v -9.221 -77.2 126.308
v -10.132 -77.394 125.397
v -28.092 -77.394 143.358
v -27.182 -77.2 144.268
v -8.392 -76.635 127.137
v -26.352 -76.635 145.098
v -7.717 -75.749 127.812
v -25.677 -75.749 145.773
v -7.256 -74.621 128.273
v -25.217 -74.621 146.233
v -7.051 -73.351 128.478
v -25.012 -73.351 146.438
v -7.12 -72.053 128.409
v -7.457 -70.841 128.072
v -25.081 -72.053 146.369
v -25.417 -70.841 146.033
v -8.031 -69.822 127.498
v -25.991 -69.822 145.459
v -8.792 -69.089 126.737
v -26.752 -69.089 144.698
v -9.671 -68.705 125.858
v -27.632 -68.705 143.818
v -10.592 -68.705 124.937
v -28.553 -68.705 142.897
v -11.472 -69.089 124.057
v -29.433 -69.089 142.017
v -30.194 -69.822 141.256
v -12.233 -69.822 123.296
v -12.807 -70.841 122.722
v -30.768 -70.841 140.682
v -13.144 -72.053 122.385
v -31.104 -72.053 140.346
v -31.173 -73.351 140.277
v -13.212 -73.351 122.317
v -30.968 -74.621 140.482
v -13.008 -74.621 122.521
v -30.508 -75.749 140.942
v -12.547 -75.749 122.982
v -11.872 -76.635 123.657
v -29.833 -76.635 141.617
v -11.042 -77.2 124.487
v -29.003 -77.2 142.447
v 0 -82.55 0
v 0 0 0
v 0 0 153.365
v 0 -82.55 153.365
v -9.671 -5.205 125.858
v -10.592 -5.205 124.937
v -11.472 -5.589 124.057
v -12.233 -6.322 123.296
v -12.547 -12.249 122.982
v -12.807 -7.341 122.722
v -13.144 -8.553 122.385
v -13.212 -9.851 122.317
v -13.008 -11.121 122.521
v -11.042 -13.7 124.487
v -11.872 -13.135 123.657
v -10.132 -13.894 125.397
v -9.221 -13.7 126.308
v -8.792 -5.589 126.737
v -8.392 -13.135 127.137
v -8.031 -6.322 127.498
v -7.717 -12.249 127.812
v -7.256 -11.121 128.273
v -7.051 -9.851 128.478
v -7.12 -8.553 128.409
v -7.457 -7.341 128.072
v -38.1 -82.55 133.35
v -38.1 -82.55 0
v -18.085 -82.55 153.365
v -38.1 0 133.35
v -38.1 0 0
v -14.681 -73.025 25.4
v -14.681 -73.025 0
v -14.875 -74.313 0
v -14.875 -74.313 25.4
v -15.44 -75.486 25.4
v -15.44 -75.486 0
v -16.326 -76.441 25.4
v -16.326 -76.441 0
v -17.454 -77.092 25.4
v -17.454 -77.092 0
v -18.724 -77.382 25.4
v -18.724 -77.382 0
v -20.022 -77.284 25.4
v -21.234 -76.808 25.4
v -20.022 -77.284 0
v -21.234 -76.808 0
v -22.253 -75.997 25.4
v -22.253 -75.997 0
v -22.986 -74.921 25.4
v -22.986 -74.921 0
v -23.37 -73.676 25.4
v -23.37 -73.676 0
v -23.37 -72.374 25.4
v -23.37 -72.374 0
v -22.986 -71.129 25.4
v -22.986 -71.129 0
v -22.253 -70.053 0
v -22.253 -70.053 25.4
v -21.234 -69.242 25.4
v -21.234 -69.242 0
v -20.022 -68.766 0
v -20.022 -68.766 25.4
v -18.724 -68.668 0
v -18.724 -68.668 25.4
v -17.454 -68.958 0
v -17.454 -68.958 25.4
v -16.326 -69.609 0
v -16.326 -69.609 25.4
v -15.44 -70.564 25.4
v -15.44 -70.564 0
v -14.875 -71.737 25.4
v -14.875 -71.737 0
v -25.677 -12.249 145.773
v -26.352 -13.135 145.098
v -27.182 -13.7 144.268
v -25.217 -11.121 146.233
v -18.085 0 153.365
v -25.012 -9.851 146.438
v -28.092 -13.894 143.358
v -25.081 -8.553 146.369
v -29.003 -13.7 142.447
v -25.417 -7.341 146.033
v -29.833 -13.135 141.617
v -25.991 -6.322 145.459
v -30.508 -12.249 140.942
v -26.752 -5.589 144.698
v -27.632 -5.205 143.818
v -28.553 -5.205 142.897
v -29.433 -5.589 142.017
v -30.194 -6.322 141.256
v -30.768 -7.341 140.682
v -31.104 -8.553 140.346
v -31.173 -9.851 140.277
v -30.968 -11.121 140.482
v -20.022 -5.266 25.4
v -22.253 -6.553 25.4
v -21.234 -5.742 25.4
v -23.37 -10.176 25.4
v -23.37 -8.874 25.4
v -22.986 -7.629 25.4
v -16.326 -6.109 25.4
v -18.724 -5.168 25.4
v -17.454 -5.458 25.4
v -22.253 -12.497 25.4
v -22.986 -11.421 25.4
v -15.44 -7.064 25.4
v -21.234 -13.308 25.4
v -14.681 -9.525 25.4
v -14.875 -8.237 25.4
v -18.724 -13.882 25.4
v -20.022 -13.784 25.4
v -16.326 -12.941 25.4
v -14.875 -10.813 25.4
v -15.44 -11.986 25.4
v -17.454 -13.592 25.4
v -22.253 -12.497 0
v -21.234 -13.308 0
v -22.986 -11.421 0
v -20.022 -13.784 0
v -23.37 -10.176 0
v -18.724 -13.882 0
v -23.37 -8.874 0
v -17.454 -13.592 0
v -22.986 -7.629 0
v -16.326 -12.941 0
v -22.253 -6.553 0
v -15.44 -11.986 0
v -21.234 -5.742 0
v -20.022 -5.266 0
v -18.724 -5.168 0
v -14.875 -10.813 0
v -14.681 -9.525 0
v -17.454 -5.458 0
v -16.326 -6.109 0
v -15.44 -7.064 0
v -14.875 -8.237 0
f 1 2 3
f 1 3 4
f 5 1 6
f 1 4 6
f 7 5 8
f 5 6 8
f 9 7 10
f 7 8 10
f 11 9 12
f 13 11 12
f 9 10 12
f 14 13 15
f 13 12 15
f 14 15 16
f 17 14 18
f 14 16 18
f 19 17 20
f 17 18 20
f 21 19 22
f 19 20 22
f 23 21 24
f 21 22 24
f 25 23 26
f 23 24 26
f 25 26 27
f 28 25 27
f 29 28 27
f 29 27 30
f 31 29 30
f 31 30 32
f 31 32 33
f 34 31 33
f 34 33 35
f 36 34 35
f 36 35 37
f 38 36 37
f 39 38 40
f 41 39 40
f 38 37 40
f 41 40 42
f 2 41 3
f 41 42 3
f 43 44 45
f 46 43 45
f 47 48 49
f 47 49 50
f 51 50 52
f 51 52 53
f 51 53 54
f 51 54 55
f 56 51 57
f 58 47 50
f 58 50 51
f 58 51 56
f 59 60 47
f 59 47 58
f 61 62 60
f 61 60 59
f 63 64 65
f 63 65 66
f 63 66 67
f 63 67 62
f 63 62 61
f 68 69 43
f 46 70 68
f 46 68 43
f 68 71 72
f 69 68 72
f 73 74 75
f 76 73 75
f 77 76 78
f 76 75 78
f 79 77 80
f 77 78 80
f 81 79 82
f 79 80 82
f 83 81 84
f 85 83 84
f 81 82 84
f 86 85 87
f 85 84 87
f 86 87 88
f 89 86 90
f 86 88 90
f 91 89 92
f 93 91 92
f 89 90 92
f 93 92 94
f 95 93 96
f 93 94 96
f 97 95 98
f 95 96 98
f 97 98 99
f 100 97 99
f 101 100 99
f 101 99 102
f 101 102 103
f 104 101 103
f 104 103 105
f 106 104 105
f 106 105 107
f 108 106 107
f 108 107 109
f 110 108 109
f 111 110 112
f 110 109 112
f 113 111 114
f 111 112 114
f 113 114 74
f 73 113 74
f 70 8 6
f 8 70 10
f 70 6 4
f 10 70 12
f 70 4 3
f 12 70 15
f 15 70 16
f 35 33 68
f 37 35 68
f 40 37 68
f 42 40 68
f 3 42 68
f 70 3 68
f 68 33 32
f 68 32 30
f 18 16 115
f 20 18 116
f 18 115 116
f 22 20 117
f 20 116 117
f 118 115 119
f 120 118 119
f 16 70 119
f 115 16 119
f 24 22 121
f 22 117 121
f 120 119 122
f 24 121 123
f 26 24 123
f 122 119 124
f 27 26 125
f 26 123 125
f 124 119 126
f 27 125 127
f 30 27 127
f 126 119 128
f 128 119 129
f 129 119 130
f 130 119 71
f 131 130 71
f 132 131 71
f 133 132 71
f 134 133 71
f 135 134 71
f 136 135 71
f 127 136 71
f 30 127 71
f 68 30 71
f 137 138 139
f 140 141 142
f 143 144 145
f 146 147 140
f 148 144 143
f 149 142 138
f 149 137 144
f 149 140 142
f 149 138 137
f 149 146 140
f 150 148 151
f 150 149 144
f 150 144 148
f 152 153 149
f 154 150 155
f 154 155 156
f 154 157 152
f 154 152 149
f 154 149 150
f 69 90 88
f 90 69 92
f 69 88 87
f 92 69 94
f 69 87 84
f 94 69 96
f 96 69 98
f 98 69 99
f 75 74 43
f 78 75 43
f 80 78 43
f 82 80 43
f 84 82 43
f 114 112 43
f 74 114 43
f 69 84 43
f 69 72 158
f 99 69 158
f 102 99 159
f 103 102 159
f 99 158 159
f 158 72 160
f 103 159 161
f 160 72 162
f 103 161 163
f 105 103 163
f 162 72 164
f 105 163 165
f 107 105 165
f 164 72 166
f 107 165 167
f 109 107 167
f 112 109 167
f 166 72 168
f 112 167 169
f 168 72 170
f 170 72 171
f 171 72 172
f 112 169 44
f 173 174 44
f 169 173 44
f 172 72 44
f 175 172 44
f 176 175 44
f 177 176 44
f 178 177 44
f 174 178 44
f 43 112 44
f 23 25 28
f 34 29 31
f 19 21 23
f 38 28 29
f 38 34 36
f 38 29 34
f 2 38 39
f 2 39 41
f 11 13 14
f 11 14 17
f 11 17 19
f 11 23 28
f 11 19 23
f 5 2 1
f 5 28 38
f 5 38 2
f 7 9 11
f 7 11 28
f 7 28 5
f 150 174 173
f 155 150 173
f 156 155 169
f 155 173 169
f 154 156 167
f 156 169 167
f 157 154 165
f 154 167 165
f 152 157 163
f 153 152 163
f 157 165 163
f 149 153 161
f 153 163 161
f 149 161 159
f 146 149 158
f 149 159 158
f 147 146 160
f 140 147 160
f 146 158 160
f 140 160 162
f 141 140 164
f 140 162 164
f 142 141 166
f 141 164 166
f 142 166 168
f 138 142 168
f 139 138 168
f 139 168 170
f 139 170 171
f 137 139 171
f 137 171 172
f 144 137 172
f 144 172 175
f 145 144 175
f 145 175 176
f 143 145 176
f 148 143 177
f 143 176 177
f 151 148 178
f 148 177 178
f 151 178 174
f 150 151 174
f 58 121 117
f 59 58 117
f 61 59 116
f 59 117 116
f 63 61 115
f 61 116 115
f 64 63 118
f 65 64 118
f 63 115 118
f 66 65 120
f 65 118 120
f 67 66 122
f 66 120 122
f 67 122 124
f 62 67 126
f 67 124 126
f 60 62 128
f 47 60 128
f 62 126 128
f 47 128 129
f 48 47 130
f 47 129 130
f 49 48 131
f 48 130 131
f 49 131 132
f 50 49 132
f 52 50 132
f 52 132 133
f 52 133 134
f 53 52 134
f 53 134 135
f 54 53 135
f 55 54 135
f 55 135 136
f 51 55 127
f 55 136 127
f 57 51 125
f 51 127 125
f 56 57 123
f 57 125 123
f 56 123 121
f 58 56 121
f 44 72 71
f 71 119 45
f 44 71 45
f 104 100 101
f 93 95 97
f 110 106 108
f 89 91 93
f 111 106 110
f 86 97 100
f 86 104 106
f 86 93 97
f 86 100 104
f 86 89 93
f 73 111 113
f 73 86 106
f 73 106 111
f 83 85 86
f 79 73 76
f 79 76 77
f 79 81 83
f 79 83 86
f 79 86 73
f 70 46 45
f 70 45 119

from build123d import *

# Parameters (mm, degrees)
F1_DEPTH = 82.55
F3_R     = 4.3688
F4_DEPTH = 25.4
F5_DEPTH = 25.4


with BuildPart() as f1:
    # F0 (on Front) → F1 (new body)
    with BuildSketch(Plane.XZ):
        Polygon((-38.1, 0), (0, 0), (0, 153.3652), (-18.0848, 153.3652), (-38.1, 133.35), align=None)
    extrude(amount=F1_DEPTH)

    # F3 (on face) → F4 (cut)
    with BuildSketch(Plane(origin=(0, 0, 0), x_dir=(1, 0, 0), z_dir=(0, 0, -1))):
        with Locations((-19.05, 9.525)):
            Circle(F3_R)
        with Locations((-19.05, 73.025)):
            Circle(F3_R)
    extrude(amount=-F4_DEPTH, mode=Mode.SUBTRACT)

    # F2 (on face) → F5 (cut)
    with BuildSketch(Plane(origin=(-85.725, 0, 85.725), x_dir=(0, -1, 0), z_dir=(-0.707107, 0, 0.707107))):
        with BuildLine():
            ThreePointArc((68.6562, 81.504805), (73.025, 77.136005), (77.3938, 81.504805))
            Line((77.3938, 81.504805), (73.025, 81.504805))
            Line((73.025, 81.504805), (68.6562, 81.504805))
        make_face()
        with BuildLine():
            Line((73.025, 81.504805), (77.3938, 81.504805))
            ThreePointArc((77.3938, 81.504805), (73.025, 85.873605), (68.6562, 81.504805))
            Line((68.6562, 81.504805), (73.025, 81.504805))
        make_face()
        with BuildLine():
            ThreePointArc((5.1562, 81.504805), (9.525, 77.136005), (13.8938, 81.504805))
            Line((13.8938, 81.504805), (9.525, 81.504805))
            Line((9.525, 81.504805), (5.1562, 81.504805))
        make_face()
        with BuildLine():
            Line((9.525, 81.504805), (13.8938, 81.504805))
            ThreePointArc((13.8938, 81.504805), (9.525, 85.873605), (5.1562, 81.504805))
            Line((5.1562, 81.504805), (9.525, 81.504805))
        make_face()
    extrude(amount=-F5_DEPTH, mode=Mode.SUBTRACT)


solid = f1.part
